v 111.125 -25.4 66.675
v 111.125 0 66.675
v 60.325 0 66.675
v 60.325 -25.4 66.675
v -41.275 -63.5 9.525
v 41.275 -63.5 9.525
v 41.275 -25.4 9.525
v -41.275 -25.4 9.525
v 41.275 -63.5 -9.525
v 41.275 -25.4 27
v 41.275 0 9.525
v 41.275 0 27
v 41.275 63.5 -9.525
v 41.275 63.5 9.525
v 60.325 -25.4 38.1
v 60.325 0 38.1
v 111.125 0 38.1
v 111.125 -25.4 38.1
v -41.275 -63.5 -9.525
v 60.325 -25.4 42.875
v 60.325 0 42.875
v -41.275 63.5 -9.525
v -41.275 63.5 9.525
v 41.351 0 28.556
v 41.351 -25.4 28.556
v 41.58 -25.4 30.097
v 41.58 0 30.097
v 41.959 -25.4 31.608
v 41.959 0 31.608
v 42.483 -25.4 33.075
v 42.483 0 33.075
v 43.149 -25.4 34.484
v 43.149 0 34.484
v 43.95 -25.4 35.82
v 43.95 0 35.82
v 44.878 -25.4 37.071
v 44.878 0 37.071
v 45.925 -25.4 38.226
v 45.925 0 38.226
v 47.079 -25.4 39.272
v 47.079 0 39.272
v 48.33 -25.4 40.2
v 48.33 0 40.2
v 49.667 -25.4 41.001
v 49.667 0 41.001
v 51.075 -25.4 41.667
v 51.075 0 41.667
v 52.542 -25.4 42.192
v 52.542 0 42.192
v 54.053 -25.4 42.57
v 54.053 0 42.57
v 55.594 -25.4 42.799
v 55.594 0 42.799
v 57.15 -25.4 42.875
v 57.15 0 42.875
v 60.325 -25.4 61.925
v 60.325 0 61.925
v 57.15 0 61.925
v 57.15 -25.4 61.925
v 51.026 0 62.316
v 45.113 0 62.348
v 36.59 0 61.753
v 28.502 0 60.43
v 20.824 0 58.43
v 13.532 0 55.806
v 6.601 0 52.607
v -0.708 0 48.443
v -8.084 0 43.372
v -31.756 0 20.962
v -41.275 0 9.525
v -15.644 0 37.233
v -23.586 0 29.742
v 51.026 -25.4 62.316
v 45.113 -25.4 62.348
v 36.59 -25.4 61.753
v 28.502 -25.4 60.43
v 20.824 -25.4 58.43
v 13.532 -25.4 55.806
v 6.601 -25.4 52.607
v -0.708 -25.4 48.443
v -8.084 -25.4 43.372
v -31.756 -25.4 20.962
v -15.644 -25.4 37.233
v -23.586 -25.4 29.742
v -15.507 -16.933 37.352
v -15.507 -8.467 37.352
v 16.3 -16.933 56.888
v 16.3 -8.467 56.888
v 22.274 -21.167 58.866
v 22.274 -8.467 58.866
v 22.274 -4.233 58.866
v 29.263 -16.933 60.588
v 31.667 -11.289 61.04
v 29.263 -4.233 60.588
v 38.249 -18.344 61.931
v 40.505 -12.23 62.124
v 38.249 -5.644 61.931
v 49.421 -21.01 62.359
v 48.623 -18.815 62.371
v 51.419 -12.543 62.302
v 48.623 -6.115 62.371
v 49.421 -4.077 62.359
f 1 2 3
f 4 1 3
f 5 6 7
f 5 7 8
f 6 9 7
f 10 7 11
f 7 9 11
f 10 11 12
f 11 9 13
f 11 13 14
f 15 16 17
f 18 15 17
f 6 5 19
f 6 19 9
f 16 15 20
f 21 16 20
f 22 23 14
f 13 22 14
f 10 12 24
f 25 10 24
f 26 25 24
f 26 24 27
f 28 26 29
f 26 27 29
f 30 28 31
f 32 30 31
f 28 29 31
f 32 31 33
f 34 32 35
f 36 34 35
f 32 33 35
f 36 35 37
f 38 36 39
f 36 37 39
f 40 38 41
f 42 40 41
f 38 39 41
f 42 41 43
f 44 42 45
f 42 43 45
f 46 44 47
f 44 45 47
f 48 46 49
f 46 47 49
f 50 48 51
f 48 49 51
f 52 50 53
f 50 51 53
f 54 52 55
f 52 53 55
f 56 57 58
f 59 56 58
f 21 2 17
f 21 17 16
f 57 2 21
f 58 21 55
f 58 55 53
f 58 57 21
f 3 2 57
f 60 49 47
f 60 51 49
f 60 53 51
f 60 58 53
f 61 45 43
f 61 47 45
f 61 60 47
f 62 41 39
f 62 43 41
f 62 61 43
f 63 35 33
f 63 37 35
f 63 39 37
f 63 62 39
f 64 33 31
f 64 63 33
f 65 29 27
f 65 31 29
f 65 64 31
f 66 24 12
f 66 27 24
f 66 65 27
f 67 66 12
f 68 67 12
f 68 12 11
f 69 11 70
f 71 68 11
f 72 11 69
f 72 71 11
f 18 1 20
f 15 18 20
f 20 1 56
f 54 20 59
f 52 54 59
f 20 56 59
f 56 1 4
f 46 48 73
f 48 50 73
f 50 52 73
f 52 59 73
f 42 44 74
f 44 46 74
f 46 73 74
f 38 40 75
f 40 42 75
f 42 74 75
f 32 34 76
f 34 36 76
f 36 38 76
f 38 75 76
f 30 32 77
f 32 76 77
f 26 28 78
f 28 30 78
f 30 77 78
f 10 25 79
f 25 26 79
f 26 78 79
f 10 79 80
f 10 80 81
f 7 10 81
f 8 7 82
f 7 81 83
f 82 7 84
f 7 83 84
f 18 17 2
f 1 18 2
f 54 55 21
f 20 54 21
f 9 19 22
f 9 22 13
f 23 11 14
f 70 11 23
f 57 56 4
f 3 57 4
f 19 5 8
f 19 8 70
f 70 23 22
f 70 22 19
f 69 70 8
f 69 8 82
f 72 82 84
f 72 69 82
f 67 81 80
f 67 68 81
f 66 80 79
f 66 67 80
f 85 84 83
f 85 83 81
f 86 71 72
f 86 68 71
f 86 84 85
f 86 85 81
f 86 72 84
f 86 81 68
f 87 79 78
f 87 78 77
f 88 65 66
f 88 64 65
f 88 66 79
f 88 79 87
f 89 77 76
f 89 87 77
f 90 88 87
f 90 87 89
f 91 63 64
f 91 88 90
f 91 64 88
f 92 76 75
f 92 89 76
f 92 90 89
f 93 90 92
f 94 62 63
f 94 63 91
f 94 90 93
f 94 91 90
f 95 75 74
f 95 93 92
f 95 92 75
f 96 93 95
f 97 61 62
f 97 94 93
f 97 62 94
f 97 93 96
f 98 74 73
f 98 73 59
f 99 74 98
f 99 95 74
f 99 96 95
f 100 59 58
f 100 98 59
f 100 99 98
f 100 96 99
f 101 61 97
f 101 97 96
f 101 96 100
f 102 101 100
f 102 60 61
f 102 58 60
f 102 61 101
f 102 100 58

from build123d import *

# Parameters (mm, degrees)
F1_DEPTH = 63.5
F0_W     = 25.4
F0_H     = 19.05
F0_H_2   = 4.7498
F0_H_3   = 4.7752
F2_DEPTH = 25.4


with BuildPart() as f1:
    # F0 (on Front) → F1 (new body, symmetric)
    with BuildSketch(Plane.XZ):
        Polygon((22.225, 9.525), (-41.275, 9.525), (-41.275, -9.525), (41.275, -9.525), (41.275, 9.525), align=None)
    extrude(amount=F1_DEPTH, both=True)

    # F0 (on Front) → F2 (join)
    with BuildSketch(Plane.XZ):
        with BuildLine():
            add(Edge.make_bspline(
                [(-41.275, 9.525), (-17.5234507769, 39.429217577), (10.7755595818, 66.2067756057), (57.15, 61.9252)],
                knots=[0, 0, 0, 0, 111.5045361635, 111.5045361635, 111.5045361635, 111.5045361635], degree=3))
            Line((-41.275, 9.525), (22.225, 9.525))
            Line((22.225, 9.525), (22.225, 27.0002))
            ThreePointArc((22.225, 27.0002), (32.4542956671, 51.6959043329), (57.15, 61.9252))
        make_face()
        Polygon((22.225, 9.525), (-41.275, 9.525), (-41.275, -9.525), (41.275, -9.525), (41.275, 9.525), align=None)
        with BuildLine():
            Line((22.225, 27.0002), (22.225, 9.525))
            Line((22.225, 9.525), (41.275, 9.525))
            Line((41.275, 9.525), (41.275, 27.0002))
            ThreePointArc((41.275, 27.0002), (45.9246798487, 38.2255201513), (57.15, 42.8752))
            Line((57.15, 42.8752), (60.325, 42.8752))
            Line((60.325, 42.8752), (60.325, 61.9252))
            Line((60.325, 61.9252), (57.15, 61.9252))
            ThreePointArc((57.15, 61.9252), (32.4542956671, 51.6959043329), (22.225, 27.0002))
        make_face()
        with Locations((73.025, 52.4002)):
            Rectangle(F0_W, F0_H)
        with Locations((73.025, 64.3001)):
            Rectangle(F0_W, F0_H_2)
        with Locations((73.025, 40.4876)):
            Rectangle(F0_W, F0_H_3)
        Polygon((85.725, 66.675), (85.725, 61.9252), (85.725, 42.8752), (85.725, 38.1), (111.125, 38.1), (111.125, 66.675), align=None)
    extrude(amount=F2_DEPTH)


solid = f1.part
